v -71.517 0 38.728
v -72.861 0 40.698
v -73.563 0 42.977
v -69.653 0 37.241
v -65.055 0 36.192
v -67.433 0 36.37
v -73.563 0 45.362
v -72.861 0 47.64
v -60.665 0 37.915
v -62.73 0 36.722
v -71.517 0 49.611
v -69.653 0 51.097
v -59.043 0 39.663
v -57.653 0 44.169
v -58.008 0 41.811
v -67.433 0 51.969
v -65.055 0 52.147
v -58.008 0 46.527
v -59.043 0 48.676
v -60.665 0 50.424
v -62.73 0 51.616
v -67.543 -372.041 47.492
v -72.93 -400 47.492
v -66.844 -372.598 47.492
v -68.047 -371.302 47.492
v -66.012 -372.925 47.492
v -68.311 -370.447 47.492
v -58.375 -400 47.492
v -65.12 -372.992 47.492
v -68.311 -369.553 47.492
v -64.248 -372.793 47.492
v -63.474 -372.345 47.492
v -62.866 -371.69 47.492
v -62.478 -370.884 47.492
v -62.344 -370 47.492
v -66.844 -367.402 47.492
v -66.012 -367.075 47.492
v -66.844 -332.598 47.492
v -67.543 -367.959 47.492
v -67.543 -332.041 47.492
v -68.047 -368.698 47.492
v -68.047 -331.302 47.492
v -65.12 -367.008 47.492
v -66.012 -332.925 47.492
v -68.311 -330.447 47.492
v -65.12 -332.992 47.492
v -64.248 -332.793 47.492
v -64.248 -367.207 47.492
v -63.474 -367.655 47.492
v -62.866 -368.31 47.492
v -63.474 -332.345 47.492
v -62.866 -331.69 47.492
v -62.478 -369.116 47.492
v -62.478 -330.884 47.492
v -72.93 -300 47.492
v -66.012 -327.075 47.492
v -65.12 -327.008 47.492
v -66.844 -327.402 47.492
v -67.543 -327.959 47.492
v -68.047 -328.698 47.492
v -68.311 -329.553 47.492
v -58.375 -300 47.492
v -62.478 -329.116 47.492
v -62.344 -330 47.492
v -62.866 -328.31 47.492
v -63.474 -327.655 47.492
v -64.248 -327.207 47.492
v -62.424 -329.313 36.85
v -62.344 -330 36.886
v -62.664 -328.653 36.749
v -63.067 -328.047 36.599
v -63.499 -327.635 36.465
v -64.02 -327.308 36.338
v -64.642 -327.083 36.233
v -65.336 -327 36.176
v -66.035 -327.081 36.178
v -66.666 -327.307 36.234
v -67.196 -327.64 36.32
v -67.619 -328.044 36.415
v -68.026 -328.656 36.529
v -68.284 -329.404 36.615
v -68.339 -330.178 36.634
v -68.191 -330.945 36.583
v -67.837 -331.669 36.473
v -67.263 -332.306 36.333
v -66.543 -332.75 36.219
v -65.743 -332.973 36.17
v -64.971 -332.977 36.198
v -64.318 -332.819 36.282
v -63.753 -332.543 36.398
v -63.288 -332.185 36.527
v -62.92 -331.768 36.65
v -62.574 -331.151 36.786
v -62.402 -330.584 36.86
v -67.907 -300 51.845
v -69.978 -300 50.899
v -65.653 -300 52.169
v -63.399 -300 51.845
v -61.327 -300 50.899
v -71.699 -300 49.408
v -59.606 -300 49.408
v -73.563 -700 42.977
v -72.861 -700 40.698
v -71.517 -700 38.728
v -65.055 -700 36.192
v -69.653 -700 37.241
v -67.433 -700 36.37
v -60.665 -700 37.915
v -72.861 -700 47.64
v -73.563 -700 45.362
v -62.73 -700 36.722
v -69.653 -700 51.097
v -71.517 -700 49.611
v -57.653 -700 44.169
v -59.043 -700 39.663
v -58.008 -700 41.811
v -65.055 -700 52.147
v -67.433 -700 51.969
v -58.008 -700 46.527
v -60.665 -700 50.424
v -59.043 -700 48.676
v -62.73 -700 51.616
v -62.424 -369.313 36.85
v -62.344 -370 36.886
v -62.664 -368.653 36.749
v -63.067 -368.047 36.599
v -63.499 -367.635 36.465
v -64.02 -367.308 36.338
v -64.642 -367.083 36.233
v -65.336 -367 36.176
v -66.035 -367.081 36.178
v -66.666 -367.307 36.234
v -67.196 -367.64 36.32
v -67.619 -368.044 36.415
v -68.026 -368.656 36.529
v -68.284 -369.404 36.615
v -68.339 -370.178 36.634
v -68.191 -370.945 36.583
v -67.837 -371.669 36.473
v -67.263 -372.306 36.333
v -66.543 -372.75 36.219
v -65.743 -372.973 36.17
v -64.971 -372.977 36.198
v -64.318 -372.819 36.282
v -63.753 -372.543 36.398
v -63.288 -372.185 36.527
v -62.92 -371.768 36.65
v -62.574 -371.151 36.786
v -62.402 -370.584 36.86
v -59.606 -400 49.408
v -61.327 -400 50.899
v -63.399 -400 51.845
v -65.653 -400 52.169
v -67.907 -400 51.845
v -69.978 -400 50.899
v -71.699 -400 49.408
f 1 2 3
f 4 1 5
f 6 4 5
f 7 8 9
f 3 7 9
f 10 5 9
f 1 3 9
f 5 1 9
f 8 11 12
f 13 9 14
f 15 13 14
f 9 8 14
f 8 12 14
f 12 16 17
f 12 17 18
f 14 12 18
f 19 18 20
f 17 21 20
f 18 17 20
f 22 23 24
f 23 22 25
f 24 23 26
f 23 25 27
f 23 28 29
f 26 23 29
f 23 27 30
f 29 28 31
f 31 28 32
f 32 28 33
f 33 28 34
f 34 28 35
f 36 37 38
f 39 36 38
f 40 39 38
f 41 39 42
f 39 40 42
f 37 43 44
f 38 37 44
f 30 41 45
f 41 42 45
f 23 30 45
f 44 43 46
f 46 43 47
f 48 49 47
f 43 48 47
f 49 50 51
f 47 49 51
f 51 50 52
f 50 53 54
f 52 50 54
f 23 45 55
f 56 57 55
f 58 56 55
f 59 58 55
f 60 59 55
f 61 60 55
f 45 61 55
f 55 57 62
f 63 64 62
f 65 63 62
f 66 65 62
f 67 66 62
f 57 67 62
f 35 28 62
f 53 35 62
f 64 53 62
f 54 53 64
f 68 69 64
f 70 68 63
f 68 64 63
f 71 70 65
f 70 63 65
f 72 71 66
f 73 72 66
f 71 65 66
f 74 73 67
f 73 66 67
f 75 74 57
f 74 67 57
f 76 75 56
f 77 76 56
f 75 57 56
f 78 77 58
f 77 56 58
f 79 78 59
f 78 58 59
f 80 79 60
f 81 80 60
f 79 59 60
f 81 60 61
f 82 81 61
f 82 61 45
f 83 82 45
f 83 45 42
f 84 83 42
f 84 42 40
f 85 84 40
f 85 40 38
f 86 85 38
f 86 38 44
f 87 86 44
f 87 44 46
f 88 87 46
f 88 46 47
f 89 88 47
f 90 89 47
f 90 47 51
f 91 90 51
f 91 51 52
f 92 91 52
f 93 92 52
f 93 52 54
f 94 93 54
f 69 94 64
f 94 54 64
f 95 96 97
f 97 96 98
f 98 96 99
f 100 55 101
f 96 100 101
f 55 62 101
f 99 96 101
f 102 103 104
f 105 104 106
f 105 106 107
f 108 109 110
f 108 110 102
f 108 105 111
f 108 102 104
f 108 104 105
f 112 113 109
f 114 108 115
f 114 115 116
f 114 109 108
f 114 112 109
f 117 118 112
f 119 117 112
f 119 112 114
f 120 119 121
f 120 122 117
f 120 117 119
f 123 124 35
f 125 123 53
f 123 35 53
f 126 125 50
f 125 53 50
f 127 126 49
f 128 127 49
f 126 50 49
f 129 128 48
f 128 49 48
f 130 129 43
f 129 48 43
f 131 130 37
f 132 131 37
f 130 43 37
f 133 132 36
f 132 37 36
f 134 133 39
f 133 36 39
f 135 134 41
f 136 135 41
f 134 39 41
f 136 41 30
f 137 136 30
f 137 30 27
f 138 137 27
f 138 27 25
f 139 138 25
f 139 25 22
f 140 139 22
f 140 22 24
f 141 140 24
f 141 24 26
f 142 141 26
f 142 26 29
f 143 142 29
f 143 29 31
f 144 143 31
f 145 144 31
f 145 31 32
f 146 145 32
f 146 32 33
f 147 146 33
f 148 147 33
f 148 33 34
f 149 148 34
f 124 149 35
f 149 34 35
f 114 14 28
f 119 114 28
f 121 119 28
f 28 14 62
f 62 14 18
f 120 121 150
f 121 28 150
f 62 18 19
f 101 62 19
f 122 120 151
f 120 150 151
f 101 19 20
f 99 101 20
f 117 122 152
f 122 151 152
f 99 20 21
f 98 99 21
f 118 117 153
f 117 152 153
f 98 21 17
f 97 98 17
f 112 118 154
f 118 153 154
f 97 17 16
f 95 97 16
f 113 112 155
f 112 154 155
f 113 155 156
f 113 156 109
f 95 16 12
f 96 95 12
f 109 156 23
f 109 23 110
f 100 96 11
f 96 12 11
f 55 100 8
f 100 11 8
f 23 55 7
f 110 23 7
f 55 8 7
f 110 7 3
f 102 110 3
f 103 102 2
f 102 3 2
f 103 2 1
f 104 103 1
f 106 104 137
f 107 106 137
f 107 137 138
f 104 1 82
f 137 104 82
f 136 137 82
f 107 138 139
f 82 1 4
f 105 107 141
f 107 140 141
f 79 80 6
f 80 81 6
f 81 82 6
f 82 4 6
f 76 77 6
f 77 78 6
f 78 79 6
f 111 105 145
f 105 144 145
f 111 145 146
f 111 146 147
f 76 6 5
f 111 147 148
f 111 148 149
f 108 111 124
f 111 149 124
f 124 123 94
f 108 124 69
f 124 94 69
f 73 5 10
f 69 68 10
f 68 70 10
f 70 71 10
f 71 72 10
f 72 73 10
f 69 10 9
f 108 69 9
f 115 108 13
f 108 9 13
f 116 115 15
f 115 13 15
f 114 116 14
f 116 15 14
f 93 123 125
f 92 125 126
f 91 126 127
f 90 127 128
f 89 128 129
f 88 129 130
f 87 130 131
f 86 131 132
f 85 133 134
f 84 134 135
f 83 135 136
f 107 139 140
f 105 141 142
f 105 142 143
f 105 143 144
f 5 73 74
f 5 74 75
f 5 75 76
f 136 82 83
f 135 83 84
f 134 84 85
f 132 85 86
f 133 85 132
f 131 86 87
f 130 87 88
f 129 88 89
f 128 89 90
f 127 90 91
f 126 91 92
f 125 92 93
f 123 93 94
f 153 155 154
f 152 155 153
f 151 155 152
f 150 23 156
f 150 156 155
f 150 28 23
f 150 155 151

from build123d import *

# Parameters (mm, degrees)
F0_R     = 8
F1_DEPTH = 700
F2_W     = 100
F2_H     = 5
F3_DEPTH = 88
F4_R     = 3
F5_DEPTH = 15


with BuildPart() as f1:
    # F0 (on Front) → F1 (new body)
    with BuildSketch(Plane.XZ):
        with Locations((-65.652847, 44.169296)):
            Circle(F0_R)
    extrude(amount=F1_DEPTH)

    # F2 (on Right) → F3 (cut)
    with BuildSketch(Plane.YZ):
        with Locations((-350, 49.991539)):
            Rectangle(F2_W, F2_H)
    extrude(amount=-F3_DEPTH, mode=Mode.SUBTRACT)

    # F4 (on face) → F5 (cut)
    with BuildSketch(Plane.XY.offset(47.491539)):
        with Locations((-65.344319, -370)):
            Circle(F4_R)
        with Locations((-65.344319, -330)):
            Circle(F4_R)
    extrude(amount=-F5_DEPTH, mode=Mode.SUBTRACT)


solid = f1.part
